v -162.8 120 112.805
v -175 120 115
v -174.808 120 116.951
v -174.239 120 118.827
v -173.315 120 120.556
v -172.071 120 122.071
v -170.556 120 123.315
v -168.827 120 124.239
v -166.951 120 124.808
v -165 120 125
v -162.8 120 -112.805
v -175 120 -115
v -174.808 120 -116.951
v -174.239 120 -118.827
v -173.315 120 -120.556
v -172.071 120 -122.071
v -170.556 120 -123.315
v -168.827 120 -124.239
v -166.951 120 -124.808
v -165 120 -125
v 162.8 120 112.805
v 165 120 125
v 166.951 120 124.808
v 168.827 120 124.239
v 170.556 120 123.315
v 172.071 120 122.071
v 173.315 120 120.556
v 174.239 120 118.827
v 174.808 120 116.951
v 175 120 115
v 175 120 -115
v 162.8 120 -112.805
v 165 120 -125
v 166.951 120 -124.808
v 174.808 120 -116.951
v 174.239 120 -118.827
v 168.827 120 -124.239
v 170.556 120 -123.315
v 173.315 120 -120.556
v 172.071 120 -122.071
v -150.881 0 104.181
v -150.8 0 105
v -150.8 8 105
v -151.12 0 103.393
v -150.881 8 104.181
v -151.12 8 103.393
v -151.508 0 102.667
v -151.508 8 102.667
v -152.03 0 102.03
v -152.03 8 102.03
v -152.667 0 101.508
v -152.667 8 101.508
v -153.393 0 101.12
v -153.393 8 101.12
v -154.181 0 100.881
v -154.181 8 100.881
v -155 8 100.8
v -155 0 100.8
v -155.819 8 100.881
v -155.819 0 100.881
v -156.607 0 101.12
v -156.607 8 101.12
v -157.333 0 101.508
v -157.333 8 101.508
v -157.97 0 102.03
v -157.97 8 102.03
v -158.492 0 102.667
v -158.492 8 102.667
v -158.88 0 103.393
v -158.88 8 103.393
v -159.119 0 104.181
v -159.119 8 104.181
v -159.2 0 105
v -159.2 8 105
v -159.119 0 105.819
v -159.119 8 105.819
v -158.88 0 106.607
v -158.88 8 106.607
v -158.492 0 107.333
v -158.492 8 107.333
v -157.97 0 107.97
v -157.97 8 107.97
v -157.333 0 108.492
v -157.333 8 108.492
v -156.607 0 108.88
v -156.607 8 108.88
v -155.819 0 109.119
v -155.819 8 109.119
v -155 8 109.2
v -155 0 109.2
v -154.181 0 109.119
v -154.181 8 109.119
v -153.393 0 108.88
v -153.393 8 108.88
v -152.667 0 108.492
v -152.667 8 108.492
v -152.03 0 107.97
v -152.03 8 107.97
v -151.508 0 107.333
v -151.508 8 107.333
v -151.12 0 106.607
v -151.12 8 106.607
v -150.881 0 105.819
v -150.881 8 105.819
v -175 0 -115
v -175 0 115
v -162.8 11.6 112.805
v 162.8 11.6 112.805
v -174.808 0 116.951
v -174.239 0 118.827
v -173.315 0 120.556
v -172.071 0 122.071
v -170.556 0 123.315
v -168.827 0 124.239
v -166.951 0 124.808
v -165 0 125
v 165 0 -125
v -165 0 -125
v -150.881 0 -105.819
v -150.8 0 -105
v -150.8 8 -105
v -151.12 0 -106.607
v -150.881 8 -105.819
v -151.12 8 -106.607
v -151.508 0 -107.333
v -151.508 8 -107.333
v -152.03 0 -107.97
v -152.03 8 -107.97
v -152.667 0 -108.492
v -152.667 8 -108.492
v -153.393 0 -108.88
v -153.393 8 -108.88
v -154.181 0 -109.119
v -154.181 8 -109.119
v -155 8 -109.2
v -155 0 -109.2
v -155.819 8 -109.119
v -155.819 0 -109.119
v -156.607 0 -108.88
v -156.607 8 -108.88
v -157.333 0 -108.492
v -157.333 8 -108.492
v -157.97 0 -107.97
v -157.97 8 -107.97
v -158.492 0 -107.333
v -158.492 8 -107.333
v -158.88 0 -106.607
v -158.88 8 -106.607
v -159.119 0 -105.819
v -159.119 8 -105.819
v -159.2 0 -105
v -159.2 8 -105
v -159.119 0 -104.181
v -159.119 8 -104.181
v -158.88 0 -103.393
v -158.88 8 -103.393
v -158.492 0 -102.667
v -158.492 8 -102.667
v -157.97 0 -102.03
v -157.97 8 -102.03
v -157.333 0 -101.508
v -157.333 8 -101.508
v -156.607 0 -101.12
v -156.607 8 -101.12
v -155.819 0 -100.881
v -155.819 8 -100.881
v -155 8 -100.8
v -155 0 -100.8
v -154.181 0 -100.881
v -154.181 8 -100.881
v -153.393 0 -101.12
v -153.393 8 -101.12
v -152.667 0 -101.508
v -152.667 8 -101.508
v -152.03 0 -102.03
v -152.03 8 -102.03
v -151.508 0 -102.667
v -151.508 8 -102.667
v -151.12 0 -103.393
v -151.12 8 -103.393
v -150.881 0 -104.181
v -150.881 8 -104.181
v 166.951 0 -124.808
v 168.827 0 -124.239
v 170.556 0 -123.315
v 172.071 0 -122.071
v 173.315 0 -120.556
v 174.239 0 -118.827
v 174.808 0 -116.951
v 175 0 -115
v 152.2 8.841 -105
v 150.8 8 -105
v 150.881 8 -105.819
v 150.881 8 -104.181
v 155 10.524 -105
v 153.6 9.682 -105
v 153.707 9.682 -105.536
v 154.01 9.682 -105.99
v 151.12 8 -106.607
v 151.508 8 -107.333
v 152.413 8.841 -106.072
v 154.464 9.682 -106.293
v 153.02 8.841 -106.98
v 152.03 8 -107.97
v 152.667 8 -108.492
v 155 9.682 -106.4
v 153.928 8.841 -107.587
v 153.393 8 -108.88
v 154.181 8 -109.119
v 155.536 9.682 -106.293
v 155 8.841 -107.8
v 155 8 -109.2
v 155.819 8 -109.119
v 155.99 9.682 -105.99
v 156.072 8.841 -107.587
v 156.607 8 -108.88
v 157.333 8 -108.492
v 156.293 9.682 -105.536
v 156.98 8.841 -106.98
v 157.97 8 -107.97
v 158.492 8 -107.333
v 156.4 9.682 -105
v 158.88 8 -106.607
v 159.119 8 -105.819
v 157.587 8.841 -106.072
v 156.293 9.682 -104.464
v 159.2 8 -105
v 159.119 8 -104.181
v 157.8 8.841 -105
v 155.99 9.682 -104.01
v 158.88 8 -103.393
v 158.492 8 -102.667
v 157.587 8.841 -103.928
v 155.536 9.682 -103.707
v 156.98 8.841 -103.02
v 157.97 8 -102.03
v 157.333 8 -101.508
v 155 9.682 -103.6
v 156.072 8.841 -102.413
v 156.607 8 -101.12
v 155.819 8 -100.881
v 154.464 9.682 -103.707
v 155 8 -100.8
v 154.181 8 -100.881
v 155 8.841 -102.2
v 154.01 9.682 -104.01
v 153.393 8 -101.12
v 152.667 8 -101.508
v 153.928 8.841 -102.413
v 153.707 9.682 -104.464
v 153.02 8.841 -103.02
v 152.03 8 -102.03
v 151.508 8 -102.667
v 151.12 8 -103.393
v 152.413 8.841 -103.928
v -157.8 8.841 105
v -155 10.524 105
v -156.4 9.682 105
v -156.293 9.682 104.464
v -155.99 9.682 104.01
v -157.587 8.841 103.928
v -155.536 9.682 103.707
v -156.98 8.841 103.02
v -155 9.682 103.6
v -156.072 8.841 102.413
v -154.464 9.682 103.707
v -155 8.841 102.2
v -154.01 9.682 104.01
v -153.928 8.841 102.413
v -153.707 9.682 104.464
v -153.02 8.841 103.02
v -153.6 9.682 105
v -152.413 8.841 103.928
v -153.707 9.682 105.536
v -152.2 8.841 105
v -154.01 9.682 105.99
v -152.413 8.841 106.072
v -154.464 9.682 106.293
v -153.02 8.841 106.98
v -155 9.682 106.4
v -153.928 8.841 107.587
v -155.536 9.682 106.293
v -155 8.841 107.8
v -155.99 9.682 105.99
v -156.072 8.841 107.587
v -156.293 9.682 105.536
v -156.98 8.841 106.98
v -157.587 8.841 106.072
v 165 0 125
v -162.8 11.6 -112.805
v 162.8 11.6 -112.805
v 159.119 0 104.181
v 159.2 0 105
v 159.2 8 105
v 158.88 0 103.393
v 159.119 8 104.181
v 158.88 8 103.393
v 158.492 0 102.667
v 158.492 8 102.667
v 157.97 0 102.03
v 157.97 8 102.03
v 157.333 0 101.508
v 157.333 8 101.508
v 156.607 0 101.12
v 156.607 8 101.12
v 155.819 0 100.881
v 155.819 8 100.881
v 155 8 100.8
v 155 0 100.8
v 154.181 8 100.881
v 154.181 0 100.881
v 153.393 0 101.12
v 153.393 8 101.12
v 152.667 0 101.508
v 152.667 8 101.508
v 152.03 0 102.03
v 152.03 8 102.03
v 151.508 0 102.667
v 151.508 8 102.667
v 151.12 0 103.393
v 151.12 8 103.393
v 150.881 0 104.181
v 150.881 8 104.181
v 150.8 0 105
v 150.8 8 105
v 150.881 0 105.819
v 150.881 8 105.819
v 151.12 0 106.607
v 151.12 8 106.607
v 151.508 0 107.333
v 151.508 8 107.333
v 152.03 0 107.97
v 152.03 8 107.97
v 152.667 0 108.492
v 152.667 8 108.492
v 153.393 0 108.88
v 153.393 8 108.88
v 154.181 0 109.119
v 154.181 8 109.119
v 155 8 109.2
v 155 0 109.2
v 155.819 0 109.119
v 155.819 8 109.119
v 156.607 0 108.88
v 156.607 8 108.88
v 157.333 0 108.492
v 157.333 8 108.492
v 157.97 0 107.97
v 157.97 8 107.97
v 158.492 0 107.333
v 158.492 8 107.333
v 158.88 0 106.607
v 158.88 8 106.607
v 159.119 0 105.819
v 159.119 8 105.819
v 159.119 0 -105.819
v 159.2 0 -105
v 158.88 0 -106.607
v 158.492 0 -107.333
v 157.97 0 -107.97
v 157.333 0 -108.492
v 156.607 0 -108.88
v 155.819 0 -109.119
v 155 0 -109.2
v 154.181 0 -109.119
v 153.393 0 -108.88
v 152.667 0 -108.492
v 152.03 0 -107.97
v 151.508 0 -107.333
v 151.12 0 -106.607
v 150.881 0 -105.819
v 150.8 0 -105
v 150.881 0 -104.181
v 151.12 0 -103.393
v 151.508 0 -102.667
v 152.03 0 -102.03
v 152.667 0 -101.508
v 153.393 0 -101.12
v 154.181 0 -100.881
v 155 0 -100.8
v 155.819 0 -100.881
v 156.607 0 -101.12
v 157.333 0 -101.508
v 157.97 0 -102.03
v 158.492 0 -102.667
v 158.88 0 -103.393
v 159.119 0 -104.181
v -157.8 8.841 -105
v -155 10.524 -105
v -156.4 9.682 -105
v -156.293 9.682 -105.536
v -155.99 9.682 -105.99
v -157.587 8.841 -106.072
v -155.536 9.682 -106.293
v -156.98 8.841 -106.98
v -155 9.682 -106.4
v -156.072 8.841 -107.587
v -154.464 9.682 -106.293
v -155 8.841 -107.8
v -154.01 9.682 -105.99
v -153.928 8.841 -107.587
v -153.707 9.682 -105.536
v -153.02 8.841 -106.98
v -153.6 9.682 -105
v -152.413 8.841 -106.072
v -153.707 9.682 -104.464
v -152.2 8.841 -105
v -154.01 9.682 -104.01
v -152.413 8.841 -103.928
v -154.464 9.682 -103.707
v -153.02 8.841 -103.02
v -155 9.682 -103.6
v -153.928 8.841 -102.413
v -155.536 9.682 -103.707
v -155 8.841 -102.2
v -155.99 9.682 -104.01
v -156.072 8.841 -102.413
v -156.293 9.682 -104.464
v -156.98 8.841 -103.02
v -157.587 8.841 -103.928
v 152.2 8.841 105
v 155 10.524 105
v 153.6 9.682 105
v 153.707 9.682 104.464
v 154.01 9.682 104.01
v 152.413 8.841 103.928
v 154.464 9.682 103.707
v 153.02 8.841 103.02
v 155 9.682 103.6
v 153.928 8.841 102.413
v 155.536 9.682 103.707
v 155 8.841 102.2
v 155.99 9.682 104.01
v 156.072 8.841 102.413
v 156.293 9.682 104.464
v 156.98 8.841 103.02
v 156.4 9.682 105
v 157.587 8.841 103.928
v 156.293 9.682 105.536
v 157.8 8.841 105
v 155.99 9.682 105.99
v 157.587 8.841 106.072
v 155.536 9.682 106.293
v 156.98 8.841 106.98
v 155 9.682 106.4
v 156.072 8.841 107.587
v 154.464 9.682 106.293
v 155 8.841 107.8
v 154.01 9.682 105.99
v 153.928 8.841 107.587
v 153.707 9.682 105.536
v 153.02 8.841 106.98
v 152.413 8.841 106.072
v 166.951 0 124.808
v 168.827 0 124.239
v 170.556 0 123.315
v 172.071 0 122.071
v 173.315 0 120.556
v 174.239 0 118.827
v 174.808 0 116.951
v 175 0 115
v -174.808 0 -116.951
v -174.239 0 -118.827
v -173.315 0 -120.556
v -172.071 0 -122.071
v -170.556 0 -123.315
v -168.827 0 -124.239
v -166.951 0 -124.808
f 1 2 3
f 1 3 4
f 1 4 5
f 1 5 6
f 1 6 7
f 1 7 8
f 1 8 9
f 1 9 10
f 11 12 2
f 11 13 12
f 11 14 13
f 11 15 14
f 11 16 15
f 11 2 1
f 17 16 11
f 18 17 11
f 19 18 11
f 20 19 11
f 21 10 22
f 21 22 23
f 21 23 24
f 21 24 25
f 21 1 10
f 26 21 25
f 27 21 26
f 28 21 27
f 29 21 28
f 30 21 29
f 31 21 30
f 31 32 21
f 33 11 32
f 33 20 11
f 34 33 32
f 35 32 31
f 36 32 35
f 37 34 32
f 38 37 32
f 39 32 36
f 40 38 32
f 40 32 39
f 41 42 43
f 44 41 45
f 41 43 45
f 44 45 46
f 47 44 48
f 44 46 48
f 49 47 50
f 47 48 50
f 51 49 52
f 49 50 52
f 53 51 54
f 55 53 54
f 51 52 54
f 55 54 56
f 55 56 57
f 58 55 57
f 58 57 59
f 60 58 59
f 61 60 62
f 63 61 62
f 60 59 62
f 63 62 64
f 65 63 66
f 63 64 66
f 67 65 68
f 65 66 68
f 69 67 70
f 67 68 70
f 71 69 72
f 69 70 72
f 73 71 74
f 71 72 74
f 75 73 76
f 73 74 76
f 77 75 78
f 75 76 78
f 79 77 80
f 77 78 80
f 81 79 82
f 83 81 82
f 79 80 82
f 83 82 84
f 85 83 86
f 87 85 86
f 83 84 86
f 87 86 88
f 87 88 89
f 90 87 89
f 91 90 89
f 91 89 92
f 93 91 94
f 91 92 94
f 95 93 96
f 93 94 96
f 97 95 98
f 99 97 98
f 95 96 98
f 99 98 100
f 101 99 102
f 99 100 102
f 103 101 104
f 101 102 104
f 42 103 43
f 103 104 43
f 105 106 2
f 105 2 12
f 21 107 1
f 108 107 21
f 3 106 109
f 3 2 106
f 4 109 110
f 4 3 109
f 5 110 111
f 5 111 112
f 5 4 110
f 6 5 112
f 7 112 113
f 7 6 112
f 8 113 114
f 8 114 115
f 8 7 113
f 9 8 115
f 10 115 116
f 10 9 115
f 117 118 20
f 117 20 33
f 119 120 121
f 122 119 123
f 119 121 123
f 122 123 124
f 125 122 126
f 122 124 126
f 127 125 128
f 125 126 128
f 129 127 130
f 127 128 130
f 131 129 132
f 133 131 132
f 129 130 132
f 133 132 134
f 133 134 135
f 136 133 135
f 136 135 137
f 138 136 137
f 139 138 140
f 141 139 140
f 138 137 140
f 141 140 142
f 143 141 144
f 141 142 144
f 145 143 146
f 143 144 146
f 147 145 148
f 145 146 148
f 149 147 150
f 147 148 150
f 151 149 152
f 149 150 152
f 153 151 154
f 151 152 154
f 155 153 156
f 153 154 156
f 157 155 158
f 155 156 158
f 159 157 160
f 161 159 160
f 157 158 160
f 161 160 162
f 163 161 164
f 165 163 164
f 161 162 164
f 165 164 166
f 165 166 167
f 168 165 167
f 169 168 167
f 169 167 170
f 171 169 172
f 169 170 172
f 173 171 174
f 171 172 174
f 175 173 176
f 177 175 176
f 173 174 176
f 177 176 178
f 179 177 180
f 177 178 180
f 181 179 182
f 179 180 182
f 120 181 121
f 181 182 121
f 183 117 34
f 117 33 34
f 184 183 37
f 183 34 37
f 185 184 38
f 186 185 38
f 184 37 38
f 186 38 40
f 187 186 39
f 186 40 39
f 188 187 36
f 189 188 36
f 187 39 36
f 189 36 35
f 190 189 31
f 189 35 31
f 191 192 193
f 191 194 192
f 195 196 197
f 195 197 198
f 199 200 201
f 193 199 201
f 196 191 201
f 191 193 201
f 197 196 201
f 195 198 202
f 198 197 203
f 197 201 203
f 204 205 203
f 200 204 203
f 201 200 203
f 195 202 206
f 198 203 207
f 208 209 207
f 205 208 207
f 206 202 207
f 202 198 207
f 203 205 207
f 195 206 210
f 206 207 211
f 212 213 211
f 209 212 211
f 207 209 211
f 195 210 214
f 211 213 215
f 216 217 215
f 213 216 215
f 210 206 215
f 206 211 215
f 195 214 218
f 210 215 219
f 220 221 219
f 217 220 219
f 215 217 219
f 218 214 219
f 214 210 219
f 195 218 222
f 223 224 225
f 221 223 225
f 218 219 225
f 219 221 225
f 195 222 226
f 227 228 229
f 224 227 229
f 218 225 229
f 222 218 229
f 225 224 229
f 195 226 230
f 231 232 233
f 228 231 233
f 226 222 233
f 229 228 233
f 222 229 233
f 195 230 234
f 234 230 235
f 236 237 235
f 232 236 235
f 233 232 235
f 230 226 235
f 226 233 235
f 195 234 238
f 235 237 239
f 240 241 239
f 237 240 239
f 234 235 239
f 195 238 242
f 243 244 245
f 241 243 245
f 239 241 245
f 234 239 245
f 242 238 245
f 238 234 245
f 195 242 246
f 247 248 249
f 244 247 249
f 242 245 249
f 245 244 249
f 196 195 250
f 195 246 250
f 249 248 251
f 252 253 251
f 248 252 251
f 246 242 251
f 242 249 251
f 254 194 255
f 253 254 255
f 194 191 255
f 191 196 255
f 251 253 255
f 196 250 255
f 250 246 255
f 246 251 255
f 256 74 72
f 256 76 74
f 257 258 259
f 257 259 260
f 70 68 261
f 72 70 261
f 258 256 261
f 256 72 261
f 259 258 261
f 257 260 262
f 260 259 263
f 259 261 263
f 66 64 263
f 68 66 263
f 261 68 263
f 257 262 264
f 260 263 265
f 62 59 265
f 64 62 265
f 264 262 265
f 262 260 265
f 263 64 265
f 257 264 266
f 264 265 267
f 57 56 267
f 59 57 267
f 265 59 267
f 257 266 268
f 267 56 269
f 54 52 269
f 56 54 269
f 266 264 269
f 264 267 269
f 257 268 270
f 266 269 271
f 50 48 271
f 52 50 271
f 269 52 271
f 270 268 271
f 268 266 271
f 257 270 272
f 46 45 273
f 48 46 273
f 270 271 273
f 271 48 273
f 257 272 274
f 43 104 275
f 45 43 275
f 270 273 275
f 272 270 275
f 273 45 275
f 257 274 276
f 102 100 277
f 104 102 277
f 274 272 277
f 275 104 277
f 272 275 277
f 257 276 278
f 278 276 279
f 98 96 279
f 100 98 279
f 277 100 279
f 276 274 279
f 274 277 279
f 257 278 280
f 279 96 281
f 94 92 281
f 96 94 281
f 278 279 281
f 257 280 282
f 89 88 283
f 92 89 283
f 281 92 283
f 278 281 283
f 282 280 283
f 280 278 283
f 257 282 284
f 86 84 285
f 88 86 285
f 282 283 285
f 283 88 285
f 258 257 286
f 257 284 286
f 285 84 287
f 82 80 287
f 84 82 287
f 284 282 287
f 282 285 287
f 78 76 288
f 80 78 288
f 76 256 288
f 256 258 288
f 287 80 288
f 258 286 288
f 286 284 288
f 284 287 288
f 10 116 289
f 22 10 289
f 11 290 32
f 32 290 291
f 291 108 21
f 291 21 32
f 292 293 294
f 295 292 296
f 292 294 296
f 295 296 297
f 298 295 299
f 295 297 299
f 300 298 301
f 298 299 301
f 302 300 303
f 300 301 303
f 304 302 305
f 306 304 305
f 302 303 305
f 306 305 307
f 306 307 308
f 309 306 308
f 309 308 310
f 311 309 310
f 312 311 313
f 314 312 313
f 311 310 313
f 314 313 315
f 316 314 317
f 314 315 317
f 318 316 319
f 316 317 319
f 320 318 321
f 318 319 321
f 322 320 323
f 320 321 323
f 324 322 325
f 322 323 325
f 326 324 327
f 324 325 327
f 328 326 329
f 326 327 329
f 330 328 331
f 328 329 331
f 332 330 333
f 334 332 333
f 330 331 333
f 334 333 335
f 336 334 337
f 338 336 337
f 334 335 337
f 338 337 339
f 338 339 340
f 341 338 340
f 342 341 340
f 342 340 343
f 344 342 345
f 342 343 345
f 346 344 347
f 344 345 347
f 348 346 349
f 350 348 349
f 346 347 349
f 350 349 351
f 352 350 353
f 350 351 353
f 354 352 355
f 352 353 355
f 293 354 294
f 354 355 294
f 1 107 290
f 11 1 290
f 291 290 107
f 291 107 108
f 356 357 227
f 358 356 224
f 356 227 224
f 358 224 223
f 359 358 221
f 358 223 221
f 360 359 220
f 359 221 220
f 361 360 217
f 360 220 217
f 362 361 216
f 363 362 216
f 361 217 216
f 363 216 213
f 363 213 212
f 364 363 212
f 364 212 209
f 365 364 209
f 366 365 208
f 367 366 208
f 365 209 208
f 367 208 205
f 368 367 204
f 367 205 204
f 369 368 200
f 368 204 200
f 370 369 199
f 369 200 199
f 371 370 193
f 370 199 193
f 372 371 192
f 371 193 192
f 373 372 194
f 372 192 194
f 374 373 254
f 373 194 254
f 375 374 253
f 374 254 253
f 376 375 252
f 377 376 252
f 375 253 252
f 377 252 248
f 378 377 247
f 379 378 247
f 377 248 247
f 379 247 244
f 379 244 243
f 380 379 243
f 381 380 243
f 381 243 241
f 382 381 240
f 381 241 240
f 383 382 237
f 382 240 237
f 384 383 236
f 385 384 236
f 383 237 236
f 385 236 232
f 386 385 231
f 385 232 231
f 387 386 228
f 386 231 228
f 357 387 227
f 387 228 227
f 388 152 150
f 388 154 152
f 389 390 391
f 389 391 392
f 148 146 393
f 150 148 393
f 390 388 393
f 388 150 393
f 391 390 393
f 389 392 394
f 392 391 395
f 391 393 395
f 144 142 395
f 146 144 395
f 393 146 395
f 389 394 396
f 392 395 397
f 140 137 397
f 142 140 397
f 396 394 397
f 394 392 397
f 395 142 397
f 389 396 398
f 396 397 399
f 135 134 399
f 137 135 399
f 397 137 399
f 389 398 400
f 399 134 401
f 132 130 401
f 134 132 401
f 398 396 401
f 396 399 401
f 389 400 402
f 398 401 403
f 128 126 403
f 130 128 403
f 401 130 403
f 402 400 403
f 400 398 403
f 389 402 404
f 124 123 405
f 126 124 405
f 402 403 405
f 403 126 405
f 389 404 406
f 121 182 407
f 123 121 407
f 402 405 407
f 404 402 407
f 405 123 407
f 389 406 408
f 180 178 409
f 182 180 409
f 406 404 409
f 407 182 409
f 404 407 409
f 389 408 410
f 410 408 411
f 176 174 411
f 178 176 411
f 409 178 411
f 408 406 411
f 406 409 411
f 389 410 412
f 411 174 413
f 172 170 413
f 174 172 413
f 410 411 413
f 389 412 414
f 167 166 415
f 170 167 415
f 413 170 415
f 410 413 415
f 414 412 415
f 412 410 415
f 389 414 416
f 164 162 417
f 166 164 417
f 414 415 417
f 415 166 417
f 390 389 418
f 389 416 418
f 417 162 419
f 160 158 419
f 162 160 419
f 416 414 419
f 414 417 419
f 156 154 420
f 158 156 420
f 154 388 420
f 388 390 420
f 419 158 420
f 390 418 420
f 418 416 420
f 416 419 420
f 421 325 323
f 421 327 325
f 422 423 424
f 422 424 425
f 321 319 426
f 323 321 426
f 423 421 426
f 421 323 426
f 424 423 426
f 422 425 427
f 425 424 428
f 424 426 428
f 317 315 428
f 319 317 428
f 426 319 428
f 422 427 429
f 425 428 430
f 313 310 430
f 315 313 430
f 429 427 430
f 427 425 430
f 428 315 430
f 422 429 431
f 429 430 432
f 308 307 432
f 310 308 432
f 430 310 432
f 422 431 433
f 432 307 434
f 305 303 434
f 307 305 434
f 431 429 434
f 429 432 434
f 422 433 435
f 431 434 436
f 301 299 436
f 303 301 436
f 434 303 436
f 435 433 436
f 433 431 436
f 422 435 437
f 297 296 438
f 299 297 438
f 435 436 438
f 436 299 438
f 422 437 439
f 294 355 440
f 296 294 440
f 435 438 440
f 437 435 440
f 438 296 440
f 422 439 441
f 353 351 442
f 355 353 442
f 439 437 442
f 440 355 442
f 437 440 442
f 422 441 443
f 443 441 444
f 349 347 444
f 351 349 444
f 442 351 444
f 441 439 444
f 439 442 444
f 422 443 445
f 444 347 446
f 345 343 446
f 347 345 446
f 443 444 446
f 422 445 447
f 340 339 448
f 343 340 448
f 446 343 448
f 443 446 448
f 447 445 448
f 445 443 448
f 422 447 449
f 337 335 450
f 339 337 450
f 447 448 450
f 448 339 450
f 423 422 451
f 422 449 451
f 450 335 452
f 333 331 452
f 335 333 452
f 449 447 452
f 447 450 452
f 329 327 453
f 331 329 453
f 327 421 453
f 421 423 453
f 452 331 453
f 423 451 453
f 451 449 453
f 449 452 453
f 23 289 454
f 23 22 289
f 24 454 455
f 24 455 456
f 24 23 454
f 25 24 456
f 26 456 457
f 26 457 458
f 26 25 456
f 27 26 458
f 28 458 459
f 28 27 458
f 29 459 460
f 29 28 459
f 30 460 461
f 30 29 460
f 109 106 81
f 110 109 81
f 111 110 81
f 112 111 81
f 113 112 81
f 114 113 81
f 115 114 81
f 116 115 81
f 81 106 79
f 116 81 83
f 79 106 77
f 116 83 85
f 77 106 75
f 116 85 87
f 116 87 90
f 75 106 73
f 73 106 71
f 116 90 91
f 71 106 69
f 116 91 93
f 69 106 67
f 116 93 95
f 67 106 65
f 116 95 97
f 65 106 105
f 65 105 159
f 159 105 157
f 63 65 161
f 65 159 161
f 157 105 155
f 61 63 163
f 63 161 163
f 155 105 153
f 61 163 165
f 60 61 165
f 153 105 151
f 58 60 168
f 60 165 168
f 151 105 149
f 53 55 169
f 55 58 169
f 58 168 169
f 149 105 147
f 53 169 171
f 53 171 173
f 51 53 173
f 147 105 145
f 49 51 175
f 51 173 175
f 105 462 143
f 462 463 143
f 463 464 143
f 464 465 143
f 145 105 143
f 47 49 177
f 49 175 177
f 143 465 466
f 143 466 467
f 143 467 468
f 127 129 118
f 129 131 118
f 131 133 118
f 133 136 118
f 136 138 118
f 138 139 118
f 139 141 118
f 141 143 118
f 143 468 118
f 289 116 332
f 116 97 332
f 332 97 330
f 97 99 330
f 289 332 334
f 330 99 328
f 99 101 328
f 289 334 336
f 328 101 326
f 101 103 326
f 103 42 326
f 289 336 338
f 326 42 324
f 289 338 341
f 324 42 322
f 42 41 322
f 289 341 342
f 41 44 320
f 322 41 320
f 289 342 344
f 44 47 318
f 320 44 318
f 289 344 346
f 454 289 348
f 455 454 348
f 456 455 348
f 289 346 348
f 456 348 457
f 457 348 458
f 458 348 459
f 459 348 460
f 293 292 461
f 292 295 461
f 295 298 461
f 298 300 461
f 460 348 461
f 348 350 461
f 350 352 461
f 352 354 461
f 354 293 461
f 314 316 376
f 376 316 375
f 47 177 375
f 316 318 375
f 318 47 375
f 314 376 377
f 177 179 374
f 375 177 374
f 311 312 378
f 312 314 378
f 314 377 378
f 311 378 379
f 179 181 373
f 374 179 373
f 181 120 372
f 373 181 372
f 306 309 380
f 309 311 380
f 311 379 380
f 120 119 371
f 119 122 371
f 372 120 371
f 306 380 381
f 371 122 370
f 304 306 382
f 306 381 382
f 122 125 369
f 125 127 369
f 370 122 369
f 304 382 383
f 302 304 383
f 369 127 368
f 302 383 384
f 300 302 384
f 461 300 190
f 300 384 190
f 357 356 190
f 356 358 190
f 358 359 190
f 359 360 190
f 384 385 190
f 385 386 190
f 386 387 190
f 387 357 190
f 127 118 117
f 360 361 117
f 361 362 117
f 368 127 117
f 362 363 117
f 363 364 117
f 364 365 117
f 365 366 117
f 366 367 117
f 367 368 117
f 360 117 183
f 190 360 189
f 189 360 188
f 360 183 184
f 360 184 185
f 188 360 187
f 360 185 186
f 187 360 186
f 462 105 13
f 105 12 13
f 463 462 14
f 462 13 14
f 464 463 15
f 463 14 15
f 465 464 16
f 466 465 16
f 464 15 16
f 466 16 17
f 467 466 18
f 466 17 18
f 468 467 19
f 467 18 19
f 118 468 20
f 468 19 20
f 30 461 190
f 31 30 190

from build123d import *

# Parameters (mm, degrees)
SKETCH1_W                = 350
SKETCH1_H                = 250
SKETCH1_W_2              = 325.6
SKETCH1_H_2              = 225.61
BOSS_EXTRUDE1_DEPTH      = 120
SKETCH1_2_W              = 325.6
SKETCH1_2_H              = 225.61
BOSS_EXTRUDE2_DEPTH      = 11.6
FILLET1_R                = 10
M8_CLEARANCE_HOLE1_D     = 8.4
M8_CLEARANCE_HOLE1_DEPTH = 8
M8_CLEARANCE_HOLE1_TIP   = 2.5236146


with BuildPart() as part:
    # Sketch1 → Boss-Extrude1 (new body)
    with BuildSketch(Plane(origin=(0, 0, 0), x_dir=(1, 0, 0), z_dir=(0, 1, 0))):
        Rectangle(SKETCH1_W, SKETCH1_H)
        Rectangle(SKETCH1_W_2, SKETCH1_H_2, mode=Mode.SUBTRACT)
    extrude(amount=BOSS_EXTRUDE1_DEPTH)

    # Sketch1<2> → Boss-Extrude2 (add)
    with BuildSketch(Plane(origin=(0, 0, 0), x_dir=(1, 0, 0), z_dir=(0, 1, 0))):
        Rectangle(SKETCH1_2_W, SKETCH1_2_H)
    extrude(amount=BOSS_EXTRUDE2_DEPTH)

    # Fillet1
    fillet1_edges = [part.edges().sort_by_distance(p)[0] for p in [
        (-175, 60, -125),
        (175, 60, -125),
        (175, 60, 125),
        (-175, 60, 125),
    ]]
    fillet(fillet1_edges, radius=FILLET1_R)

    # M8 Clearance Hole1
    with Locations(Plane(origin=(0, 0, 0), x_dir=(-1, 0, 0), z_dir=(0, -1, 0))):
        with Locations((155, -105), (-155, -105), (-155, 105), (155, 105)):
            Hole(M8_CLEARANCE_HOLE1_D / 2, depth=M8_CLEARANCE_HOLE1_DEPTH)
            with Locations((0, 0, -(M8_CLEARANCE_HOLE1_DEPTH + M8_CLEARANCE_HOLE1_TIP / 2))):  # 118° drill point
                Cone(0, M8_CLEARANCE_HOLE1_D / 2, M8_CLEARANCE_HOLE1_TIP, mode=Mode.SUBTRACT)


solid = part.part
